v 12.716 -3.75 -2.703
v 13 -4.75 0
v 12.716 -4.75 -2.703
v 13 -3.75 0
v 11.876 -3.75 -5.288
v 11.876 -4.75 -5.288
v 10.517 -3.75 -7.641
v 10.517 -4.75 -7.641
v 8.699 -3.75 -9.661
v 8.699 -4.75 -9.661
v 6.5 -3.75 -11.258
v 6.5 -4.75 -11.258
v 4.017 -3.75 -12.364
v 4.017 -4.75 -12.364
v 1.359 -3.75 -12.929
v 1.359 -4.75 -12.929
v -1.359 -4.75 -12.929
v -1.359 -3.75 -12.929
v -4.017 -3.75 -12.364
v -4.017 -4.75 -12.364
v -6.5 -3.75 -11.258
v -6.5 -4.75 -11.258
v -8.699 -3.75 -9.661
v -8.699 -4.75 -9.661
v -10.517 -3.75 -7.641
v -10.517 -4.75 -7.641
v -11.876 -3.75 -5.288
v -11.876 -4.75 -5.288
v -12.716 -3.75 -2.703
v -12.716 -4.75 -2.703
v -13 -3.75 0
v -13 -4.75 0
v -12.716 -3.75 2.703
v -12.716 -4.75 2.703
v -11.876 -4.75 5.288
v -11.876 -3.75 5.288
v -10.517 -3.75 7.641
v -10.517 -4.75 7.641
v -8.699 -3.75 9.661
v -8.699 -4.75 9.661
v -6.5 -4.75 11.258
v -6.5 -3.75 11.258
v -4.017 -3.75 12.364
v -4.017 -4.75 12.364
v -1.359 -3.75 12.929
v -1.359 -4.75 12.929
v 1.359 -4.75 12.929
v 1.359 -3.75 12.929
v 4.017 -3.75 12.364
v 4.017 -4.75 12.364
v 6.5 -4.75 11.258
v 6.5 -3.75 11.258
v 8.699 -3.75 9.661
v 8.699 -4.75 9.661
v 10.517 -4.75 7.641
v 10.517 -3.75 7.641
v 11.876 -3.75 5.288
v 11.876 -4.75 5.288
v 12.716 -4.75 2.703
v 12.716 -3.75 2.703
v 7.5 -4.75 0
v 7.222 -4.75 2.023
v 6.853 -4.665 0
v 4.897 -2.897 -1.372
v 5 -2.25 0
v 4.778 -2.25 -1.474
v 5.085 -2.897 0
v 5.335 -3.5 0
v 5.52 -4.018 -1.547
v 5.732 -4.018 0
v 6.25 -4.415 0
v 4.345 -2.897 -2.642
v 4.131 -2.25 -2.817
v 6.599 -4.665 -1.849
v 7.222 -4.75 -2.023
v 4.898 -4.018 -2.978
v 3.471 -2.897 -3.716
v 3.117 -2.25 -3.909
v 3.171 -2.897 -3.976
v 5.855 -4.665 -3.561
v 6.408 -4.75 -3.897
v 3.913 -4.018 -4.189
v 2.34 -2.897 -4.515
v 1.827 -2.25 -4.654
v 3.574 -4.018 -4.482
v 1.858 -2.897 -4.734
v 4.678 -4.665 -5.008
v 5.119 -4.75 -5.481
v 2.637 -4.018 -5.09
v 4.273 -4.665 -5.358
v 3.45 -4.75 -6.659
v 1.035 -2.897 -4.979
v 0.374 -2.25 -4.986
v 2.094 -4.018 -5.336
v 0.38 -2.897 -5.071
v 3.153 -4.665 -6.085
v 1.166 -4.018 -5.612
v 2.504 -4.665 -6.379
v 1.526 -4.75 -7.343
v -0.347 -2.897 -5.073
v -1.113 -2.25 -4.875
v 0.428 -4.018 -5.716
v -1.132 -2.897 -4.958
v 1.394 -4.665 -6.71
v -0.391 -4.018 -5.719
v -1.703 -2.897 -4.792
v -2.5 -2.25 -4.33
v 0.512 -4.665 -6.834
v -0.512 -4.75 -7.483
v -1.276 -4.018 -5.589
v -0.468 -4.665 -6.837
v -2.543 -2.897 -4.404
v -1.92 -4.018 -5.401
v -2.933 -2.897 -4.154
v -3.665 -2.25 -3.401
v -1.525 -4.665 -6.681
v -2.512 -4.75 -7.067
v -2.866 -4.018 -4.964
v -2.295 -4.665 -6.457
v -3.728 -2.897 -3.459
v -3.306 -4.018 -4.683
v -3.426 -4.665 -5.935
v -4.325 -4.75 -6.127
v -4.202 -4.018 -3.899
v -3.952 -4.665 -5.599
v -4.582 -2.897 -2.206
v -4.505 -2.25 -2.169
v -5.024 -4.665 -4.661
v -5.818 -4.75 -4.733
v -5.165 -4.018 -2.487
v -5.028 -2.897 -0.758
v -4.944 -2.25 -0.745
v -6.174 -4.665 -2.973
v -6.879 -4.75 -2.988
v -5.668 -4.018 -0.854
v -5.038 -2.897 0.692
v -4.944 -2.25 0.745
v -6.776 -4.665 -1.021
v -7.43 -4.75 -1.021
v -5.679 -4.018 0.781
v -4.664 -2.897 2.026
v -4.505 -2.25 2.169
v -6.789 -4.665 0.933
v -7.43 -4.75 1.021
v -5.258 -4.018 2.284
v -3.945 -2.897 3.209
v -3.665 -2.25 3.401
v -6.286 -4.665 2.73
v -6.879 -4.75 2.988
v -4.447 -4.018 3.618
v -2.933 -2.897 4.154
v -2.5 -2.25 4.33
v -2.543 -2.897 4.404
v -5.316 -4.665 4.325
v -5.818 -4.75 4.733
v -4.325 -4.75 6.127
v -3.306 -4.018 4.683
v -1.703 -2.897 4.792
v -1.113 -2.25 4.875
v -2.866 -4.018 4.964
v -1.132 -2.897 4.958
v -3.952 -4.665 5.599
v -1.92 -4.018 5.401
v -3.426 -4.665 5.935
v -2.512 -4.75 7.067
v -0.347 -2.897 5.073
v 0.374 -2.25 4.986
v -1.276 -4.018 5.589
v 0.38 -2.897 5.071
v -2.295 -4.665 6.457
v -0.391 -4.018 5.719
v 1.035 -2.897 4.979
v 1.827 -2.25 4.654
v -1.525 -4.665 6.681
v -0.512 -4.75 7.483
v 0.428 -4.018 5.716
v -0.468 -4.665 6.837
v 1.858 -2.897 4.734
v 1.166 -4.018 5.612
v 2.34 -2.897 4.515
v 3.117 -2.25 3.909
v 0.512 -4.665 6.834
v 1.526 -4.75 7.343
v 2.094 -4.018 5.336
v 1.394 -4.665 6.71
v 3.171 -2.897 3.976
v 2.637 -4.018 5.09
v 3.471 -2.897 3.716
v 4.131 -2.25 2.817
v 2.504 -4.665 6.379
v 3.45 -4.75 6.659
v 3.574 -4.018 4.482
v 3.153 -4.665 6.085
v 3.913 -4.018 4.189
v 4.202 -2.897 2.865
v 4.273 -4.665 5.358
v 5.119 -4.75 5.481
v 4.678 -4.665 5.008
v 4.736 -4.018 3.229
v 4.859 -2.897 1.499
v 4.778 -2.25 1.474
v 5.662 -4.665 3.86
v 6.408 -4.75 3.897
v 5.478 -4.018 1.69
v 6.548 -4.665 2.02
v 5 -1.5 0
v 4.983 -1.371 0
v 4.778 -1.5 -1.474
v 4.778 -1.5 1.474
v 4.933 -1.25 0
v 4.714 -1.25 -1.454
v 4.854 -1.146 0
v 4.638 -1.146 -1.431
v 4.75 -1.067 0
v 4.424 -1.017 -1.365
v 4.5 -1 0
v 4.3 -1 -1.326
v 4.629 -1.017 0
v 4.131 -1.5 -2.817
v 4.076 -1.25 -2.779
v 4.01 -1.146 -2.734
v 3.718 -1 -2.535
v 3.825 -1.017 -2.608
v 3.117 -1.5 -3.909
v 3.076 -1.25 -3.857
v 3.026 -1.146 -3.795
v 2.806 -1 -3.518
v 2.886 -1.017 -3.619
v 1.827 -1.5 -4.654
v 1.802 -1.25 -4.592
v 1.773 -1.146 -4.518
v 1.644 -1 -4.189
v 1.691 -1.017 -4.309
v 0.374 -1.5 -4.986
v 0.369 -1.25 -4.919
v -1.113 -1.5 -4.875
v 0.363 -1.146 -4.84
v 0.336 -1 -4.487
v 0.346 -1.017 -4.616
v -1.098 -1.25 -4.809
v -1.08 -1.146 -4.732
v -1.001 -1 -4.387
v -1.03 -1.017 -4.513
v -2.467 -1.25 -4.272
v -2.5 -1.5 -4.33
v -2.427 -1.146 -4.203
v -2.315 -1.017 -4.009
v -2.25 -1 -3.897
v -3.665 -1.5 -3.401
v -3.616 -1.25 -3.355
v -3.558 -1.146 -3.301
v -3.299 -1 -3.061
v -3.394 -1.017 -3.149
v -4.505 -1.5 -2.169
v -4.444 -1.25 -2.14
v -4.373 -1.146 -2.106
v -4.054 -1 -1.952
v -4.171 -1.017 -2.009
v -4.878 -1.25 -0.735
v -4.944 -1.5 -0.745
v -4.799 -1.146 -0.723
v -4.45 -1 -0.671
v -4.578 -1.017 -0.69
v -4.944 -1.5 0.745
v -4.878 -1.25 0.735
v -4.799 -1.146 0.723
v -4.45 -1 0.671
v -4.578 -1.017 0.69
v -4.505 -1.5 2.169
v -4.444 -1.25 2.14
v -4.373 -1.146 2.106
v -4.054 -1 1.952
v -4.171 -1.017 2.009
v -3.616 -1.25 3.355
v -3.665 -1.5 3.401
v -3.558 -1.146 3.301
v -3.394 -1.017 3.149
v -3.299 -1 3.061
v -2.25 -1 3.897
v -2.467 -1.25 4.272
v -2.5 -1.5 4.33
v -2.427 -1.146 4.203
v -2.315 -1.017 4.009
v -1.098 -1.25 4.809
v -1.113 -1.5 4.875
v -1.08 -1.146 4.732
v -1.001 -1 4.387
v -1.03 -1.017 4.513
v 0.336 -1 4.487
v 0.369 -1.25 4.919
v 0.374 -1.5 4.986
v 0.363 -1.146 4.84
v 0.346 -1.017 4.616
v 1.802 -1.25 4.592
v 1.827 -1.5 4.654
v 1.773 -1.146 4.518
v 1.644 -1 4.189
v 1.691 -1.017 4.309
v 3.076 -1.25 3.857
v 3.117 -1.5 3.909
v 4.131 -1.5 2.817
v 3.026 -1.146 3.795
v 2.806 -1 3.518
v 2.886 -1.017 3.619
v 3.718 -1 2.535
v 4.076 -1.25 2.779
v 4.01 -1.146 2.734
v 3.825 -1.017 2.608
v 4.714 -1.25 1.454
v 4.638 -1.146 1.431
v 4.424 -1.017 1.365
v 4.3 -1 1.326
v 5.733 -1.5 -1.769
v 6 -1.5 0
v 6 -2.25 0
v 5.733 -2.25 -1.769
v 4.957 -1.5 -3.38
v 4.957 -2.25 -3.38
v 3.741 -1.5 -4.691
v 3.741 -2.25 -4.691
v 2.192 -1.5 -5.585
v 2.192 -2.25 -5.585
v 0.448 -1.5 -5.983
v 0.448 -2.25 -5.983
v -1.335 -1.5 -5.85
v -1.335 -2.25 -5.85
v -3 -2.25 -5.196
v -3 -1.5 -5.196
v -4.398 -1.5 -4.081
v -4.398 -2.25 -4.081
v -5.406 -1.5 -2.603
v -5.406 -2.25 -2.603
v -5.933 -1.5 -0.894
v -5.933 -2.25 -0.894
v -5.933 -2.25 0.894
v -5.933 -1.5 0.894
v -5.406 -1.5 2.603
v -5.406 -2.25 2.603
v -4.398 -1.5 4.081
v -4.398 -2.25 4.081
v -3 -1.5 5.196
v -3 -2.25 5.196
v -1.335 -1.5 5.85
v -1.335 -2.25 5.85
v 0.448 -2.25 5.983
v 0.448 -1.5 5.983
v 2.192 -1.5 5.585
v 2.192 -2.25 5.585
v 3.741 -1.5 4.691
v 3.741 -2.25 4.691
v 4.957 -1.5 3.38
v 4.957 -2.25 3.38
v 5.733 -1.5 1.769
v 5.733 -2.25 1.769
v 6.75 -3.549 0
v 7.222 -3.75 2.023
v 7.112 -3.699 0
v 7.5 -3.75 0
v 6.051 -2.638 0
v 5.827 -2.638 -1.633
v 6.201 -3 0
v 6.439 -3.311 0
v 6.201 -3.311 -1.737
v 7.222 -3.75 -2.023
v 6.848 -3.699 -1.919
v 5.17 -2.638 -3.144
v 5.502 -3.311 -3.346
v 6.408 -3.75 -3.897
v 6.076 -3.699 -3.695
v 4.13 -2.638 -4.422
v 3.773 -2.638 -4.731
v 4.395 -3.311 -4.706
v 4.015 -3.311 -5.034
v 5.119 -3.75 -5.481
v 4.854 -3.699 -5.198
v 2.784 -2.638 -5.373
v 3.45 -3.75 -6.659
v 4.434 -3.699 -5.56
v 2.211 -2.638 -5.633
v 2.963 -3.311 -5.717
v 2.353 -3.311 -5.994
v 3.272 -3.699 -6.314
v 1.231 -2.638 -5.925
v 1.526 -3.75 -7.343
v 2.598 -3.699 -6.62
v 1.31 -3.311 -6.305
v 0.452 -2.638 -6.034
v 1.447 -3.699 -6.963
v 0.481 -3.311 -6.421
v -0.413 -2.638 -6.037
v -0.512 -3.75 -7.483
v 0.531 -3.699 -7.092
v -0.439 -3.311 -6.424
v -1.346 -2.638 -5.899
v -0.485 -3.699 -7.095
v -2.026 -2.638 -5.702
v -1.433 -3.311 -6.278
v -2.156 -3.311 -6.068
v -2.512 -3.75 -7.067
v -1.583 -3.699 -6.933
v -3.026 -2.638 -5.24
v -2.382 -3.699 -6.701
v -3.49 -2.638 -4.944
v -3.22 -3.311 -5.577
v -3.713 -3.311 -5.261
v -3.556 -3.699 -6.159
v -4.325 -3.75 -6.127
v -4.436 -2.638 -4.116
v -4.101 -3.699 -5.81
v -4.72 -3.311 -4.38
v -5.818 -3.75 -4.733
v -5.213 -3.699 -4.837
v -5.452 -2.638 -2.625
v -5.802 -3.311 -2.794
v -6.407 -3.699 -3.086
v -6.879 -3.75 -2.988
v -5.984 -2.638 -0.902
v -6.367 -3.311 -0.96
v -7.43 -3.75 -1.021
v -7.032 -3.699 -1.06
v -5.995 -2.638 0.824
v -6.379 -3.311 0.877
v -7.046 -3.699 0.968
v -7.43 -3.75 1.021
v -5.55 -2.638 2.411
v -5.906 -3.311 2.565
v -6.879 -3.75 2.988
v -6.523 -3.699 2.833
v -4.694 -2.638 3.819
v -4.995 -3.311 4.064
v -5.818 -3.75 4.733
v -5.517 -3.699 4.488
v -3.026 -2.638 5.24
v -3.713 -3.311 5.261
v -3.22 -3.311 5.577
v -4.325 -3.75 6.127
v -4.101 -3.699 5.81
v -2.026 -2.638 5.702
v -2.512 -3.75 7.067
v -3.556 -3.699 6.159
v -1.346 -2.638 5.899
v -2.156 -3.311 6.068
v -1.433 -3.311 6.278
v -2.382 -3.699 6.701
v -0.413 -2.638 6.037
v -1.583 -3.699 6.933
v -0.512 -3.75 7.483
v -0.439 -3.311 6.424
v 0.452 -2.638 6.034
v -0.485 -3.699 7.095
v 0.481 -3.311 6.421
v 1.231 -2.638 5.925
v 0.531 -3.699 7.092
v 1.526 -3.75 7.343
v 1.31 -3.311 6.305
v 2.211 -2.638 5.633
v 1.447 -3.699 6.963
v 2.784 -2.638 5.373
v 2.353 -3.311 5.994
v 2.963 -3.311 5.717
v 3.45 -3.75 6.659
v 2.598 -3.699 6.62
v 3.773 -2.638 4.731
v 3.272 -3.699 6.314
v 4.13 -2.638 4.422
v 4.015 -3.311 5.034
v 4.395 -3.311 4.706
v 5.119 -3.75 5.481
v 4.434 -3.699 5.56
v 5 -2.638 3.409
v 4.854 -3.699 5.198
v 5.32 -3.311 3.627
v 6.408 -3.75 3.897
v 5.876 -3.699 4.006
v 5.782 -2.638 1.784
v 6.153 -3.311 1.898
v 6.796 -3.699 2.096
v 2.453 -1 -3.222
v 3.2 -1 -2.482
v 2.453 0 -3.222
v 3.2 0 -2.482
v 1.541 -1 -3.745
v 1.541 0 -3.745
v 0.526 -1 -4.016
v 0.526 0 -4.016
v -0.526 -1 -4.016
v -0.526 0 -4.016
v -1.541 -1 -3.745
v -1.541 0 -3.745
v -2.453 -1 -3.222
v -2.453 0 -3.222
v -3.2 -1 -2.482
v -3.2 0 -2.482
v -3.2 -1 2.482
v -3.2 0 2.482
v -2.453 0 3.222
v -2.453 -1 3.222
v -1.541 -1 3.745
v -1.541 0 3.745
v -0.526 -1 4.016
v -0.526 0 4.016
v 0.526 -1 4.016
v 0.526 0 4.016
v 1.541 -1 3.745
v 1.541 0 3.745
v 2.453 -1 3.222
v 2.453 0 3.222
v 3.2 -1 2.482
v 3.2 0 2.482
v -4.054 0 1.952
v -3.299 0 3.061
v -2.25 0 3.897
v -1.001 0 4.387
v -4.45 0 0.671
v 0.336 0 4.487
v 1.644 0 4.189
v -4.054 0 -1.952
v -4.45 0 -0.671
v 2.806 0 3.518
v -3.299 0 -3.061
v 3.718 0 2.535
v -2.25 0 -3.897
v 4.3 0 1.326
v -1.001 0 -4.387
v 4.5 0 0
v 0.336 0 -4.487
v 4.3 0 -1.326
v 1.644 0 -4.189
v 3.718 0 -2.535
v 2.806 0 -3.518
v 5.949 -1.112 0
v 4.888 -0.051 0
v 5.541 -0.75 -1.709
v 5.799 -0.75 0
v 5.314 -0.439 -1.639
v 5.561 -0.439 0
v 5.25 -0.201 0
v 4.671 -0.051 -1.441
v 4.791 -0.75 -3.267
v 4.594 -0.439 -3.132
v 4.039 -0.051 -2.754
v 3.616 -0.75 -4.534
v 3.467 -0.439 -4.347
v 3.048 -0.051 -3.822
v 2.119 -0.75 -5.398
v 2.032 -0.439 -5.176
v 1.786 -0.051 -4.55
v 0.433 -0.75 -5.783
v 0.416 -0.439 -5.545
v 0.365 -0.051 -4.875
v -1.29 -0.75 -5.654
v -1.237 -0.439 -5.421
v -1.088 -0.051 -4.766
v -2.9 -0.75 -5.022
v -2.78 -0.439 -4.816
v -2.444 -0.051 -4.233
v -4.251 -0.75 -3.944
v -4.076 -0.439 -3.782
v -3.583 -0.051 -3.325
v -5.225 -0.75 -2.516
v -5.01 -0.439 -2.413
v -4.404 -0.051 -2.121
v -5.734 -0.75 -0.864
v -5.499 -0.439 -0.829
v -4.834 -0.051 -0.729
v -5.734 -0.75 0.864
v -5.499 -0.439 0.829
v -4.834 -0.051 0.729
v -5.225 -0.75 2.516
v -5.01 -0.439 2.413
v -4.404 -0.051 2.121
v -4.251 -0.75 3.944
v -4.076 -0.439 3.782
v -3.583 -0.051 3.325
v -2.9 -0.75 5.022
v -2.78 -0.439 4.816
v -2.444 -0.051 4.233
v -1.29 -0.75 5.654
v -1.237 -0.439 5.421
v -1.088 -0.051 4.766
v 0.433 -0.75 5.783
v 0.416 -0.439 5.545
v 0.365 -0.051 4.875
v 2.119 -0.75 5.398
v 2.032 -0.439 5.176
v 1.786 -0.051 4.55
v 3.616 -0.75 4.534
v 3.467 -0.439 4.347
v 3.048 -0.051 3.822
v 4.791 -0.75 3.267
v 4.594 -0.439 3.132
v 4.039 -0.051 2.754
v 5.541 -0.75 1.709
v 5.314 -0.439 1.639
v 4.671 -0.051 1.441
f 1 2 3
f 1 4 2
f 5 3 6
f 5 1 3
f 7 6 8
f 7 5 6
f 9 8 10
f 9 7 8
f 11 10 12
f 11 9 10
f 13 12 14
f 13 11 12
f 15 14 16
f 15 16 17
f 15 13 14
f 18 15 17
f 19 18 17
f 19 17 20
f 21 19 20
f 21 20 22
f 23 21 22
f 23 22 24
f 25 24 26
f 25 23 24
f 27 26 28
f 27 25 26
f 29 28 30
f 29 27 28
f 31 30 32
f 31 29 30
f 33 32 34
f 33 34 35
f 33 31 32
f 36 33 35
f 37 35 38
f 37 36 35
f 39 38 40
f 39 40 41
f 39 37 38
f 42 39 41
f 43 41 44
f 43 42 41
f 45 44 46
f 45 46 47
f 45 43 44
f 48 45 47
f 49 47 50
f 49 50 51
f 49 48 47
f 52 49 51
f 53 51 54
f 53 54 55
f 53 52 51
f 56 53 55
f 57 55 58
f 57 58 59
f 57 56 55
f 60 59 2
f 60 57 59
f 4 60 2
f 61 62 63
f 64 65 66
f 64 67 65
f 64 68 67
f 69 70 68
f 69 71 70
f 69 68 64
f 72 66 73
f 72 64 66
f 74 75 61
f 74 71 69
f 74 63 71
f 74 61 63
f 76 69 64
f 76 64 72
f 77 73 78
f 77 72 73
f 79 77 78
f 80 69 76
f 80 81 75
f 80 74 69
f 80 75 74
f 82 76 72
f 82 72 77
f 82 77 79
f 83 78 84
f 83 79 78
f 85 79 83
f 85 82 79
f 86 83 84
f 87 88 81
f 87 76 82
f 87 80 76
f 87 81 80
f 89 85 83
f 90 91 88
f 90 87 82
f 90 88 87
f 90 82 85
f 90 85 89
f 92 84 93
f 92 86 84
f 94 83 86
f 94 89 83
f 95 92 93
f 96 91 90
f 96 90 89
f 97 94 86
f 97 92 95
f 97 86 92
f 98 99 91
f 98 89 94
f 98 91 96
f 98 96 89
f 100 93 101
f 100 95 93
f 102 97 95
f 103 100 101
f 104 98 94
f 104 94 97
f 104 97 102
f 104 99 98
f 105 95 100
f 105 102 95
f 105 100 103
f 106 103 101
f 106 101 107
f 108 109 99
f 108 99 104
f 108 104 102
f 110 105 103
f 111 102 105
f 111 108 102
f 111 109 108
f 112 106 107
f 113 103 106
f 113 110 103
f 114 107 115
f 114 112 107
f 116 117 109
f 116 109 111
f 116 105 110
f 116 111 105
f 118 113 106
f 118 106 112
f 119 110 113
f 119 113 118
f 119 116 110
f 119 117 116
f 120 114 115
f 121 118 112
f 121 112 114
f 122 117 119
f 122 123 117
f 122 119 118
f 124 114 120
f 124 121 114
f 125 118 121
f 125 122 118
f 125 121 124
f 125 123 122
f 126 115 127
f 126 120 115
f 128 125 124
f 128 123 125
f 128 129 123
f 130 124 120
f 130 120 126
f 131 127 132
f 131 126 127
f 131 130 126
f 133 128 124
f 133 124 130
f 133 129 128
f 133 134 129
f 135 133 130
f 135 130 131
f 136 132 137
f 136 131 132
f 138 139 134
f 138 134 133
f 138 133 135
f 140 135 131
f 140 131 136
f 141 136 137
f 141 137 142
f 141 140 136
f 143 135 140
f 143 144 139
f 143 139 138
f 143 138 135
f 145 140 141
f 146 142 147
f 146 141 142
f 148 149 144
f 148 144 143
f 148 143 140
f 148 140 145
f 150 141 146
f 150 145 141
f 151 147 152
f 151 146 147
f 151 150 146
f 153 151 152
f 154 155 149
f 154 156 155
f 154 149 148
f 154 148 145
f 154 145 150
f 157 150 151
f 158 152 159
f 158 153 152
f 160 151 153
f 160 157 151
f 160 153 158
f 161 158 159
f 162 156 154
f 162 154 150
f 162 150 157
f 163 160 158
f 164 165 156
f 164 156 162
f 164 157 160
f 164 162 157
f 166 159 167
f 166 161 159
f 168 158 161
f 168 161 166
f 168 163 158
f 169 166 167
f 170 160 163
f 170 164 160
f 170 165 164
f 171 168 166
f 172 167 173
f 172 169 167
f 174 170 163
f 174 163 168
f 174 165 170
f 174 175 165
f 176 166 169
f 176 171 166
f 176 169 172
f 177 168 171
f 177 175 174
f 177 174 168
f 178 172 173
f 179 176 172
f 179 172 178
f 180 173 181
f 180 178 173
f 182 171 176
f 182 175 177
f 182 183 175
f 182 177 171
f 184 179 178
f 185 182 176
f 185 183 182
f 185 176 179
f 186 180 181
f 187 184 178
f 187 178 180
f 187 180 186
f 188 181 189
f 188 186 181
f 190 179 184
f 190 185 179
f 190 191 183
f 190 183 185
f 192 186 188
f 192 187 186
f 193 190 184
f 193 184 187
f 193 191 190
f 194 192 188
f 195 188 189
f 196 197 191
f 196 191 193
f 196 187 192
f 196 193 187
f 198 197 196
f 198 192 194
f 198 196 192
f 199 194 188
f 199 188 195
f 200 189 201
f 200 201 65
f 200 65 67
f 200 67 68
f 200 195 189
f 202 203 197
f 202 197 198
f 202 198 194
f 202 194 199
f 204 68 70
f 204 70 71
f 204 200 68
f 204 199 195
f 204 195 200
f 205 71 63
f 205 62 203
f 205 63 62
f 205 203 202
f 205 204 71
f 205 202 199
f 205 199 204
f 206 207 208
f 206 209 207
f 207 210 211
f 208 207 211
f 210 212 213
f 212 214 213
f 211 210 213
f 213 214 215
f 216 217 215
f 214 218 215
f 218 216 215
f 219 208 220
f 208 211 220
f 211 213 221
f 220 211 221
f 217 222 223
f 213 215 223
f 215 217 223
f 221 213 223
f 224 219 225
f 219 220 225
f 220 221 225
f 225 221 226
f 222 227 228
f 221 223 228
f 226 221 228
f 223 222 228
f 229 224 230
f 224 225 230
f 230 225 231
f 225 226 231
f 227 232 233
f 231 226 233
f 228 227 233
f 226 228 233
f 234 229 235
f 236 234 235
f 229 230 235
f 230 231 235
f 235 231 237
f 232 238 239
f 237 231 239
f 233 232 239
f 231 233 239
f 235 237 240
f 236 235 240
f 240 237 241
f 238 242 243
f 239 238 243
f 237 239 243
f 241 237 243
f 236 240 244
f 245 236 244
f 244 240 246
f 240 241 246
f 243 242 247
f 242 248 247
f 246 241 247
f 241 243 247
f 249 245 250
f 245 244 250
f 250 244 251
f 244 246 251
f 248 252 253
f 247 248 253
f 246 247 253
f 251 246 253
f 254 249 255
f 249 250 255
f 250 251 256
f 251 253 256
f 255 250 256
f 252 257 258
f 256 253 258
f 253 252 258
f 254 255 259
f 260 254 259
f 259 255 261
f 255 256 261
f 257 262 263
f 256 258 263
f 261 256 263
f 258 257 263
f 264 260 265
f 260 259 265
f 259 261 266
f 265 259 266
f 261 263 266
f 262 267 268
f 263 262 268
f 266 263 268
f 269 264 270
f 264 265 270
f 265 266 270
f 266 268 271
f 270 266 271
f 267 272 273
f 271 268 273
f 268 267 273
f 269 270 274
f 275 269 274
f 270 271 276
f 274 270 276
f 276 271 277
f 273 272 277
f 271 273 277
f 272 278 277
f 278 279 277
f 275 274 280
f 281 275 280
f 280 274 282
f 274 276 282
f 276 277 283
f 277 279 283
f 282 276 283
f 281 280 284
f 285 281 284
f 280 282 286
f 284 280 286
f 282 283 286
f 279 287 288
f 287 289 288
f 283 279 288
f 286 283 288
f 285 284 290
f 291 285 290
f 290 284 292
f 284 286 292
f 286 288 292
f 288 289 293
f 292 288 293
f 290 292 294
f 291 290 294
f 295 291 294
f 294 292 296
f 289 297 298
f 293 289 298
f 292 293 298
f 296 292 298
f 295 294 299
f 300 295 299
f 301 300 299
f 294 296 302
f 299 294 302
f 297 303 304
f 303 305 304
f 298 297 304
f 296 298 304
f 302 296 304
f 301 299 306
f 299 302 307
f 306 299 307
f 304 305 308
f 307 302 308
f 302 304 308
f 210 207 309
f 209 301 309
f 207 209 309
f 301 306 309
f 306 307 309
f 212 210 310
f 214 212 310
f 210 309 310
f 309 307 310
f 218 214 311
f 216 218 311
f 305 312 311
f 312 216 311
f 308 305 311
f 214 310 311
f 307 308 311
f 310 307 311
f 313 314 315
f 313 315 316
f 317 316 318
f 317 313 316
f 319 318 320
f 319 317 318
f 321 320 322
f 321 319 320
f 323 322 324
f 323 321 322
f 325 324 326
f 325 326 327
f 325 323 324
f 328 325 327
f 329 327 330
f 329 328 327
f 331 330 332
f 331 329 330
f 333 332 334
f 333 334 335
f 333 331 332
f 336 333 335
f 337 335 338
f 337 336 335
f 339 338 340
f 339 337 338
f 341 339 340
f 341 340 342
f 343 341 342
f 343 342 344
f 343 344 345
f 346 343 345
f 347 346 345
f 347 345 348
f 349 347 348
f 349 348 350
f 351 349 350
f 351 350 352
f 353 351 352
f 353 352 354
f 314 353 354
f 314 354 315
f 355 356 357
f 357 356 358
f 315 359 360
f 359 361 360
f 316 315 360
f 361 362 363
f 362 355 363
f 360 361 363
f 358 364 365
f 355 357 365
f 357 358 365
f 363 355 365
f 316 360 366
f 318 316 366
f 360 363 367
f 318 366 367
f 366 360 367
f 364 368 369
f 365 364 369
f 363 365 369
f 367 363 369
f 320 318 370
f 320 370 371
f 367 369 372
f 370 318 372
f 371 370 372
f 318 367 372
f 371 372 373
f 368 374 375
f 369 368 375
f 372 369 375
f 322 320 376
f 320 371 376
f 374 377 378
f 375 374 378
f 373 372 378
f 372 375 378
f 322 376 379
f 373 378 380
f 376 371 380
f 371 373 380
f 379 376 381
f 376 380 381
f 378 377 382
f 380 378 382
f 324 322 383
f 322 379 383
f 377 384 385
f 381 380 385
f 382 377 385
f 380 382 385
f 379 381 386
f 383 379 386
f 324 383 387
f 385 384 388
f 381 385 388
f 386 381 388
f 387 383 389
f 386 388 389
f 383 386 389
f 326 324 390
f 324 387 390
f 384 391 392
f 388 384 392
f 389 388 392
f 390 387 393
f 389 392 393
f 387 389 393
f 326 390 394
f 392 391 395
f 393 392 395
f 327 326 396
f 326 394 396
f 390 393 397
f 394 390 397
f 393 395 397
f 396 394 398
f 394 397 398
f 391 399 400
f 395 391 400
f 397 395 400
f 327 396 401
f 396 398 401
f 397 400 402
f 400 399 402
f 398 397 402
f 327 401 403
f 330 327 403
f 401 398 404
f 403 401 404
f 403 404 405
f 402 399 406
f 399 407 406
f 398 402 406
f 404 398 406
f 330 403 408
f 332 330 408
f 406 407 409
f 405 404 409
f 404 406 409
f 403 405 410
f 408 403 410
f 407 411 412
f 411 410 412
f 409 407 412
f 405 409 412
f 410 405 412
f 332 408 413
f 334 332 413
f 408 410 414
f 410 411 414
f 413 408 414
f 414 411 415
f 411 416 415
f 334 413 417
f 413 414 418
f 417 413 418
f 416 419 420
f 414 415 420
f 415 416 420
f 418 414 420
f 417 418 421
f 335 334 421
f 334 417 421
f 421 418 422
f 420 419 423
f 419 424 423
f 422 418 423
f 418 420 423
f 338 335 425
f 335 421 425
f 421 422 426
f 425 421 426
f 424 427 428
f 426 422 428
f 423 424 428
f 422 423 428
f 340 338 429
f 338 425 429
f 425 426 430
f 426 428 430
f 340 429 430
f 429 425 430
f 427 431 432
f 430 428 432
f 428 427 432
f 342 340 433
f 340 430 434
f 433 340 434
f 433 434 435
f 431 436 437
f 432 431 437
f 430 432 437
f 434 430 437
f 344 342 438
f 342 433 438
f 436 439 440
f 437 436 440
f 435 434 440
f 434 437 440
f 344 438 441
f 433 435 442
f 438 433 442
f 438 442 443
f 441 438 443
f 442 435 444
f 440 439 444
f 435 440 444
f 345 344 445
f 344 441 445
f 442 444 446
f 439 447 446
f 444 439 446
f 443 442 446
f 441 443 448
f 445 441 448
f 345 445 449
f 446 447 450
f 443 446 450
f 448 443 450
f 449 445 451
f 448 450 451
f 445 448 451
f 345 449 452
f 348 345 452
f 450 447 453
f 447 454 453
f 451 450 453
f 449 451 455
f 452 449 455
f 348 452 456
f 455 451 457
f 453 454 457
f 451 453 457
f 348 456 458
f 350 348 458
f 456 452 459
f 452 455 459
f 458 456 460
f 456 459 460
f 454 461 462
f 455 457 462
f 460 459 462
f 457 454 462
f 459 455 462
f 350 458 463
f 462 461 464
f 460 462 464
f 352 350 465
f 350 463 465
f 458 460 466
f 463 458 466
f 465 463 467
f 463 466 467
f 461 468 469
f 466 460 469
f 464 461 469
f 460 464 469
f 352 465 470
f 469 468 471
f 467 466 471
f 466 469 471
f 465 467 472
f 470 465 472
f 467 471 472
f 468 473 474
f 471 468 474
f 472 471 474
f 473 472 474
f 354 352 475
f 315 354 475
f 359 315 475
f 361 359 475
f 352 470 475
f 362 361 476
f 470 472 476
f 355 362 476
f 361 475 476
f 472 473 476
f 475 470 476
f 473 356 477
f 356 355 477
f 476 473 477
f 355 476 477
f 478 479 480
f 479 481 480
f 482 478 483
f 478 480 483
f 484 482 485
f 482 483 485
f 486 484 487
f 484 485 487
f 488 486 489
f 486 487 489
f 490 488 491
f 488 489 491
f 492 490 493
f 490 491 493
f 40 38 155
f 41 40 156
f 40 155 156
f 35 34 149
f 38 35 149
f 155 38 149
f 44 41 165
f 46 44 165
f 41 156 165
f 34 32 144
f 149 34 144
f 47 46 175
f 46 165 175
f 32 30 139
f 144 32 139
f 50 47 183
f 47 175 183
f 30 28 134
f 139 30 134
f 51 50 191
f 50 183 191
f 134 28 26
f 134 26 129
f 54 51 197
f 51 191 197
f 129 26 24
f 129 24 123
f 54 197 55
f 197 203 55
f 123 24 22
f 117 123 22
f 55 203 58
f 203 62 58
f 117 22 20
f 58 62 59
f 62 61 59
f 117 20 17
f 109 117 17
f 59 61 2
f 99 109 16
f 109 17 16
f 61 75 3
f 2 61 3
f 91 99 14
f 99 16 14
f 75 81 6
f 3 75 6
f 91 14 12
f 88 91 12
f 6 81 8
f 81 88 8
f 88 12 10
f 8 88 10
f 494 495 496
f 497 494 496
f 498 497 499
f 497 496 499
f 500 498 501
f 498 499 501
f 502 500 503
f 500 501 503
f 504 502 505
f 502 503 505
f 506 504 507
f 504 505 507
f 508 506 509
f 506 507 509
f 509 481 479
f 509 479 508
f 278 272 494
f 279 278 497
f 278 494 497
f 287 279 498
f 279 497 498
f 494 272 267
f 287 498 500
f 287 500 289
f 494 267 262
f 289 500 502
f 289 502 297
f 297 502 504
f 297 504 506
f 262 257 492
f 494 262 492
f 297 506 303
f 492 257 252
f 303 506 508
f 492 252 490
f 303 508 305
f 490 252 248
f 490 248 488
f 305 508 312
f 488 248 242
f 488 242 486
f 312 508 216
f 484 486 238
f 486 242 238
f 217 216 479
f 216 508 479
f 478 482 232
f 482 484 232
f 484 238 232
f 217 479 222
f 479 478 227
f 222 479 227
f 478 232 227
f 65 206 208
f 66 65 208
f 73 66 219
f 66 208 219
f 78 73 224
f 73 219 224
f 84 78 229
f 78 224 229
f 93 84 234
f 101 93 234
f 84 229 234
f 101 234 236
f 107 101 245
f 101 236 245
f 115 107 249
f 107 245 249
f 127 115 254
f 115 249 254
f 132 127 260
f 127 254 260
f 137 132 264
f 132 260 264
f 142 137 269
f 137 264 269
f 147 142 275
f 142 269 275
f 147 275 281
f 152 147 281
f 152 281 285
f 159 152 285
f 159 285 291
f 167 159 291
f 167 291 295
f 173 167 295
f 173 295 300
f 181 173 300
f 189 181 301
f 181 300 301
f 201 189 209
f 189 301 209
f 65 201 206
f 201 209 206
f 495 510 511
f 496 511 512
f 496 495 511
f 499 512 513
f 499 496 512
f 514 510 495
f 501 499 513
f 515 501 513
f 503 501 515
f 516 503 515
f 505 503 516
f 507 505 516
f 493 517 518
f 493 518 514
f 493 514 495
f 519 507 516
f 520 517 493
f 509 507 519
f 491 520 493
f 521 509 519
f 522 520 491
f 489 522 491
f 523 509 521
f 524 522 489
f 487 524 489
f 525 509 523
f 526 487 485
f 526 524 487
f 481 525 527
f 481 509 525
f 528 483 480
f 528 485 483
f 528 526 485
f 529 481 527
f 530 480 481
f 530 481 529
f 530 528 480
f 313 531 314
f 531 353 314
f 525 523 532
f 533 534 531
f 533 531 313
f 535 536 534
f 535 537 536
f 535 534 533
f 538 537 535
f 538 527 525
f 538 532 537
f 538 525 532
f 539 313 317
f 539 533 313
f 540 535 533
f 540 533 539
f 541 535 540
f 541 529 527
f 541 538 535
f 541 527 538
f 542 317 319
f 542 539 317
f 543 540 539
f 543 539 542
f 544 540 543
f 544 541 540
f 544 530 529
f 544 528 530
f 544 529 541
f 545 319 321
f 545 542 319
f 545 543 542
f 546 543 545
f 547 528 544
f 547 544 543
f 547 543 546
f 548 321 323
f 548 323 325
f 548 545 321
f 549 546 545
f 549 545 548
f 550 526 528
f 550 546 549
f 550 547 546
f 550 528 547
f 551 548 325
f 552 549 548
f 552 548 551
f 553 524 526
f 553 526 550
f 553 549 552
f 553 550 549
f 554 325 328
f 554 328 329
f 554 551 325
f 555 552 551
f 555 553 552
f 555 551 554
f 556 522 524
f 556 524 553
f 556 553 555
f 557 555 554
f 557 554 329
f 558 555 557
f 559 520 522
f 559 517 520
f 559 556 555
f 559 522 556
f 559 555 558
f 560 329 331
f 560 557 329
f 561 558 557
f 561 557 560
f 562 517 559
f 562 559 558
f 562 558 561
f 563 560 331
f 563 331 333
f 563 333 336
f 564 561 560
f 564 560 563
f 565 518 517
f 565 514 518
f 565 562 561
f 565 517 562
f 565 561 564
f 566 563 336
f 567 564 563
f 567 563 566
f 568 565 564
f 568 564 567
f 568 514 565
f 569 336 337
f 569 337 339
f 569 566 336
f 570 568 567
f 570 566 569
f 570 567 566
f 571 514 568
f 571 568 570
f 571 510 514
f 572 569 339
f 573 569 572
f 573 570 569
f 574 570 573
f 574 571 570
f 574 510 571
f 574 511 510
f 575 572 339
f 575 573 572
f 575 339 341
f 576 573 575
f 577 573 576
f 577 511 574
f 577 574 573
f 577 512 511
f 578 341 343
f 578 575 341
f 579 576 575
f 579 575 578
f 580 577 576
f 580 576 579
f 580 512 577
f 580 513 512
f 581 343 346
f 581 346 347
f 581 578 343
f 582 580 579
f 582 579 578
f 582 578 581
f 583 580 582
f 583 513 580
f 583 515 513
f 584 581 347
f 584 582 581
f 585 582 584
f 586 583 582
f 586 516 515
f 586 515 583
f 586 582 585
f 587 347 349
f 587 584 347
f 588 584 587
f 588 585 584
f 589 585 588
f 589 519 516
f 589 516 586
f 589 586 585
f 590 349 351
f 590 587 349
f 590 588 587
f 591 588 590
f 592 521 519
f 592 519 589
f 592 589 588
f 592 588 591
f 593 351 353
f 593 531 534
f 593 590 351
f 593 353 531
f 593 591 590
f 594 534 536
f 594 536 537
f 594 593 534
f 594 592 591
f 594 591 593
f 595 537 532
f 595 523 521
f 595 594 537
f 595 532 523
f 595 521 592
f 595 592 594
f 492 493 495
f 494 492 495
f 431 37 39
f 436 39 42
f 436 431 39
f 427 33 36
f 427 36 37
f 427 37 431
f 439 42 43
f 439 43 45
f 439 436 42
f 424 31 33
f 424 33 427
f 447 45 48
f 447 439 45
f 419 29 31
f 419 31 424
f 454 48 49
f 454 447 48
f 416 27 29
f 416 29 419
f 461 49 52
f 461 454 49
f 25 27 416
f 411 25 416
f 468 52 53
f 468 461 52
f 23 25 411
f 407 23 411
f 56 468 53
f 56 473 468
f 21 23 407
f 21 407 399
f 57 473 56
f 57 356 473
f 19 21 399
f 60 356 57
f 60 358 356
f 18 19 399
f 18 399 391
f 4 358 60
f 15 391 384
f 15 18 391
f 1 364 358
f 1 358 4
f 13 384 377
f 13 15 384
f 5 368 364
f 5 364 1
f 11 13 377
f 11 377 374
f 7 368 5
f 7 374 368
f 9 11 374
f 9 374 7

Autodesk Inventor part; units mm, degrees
ref_plane "YZ Plane" through (0, 0, 0) normal (1, 0, 0) x (0, 1, 0)
ref_plane "XZ Plane" through (0, 0, 0) normal (0, 1, 0) x (-1, 0, 0)
ref_plane "XY Plane" through (0, 0, 0) normal (0, 0, 1) x (1, 0, 0)
sketch "Sketch1" plane through (0, 0, 0) normal (0, 0, 1) x (1, 0, 0)
  line L0 (0, 0) -> (4.5, 0)
  line L1 (6, 0) -> (6, -2.25) construction
  line L2 (7.5, -3.75) -> (13, -3.75)
  line L3 (0, 0) -> (0, 5.6294)
  arc A0 (6, -2.25) -> (7.5, -3.75) centre (7.5, -2.25) ccw
  arc A1 (6, -1.5) -> (4.5, 0) centre (4.5, -1.5) ccw
  line L4 (6, -2.25) -> (6, -1.5)
  point P0 (6, -3.75)
  dimension "d0" = 12
  dimension "d1" = 26
  dimension "d2" = 3.75
  dimension "d3" = 1.5
surface revolve "RevolutionSrf1" sketch "Sketch1" angle 360 about axis through (0, 0, 0) along (0, 1, 0) shown no curves L2 A0 L4 A1 L0 L3
thicken "Thicken2" operation add thickness 1 both sides no extend neighbours no toward (0, -1, 0) faces at (0.8521, 0, 1.2345) (5.9182, -1.3879, 0.9618) (5.9805, -2, 0.4828) (7.2922, -3.7458, 1.1851) (11.0407, -3.75, 1.037)
sketch "Sketch3" plane through (0, 0, 0) normal (0, 1, 0) x (1, 0, 0)
  circle A0 centre (0, 0) radius 4.05
  line L0 (-3.2, 2.4824) -> (-3.2, -2.4824)
  line L1 (3.2, 2.4824) -> (3.2, -2.4824)
  dimension "d16" = 8.1
  dimension "d17" = 6.4
extrude "Extrusion2" cut sketch "Sketch3" against normal through all contours L1 A0 L0
equation "\"BendRadius\" = Thickness"
equation "\"BendReliefWidth\" = Thickness"
equation "\"BendReliefDepth\" = 0.5 * Thickness"
equation "\"CornerReliefSize\" = 4 * Thickness"
equation "\"MinimumRemnant\" = 2 * Thickness"
equation "\"TransitionRadius\" = BendRadius"
equation "\"JacobiRadiusSize\" = BendRadius"
equation "\"Thickness\" = 1"
properties part number "404-08" material "Steel, Mild"
